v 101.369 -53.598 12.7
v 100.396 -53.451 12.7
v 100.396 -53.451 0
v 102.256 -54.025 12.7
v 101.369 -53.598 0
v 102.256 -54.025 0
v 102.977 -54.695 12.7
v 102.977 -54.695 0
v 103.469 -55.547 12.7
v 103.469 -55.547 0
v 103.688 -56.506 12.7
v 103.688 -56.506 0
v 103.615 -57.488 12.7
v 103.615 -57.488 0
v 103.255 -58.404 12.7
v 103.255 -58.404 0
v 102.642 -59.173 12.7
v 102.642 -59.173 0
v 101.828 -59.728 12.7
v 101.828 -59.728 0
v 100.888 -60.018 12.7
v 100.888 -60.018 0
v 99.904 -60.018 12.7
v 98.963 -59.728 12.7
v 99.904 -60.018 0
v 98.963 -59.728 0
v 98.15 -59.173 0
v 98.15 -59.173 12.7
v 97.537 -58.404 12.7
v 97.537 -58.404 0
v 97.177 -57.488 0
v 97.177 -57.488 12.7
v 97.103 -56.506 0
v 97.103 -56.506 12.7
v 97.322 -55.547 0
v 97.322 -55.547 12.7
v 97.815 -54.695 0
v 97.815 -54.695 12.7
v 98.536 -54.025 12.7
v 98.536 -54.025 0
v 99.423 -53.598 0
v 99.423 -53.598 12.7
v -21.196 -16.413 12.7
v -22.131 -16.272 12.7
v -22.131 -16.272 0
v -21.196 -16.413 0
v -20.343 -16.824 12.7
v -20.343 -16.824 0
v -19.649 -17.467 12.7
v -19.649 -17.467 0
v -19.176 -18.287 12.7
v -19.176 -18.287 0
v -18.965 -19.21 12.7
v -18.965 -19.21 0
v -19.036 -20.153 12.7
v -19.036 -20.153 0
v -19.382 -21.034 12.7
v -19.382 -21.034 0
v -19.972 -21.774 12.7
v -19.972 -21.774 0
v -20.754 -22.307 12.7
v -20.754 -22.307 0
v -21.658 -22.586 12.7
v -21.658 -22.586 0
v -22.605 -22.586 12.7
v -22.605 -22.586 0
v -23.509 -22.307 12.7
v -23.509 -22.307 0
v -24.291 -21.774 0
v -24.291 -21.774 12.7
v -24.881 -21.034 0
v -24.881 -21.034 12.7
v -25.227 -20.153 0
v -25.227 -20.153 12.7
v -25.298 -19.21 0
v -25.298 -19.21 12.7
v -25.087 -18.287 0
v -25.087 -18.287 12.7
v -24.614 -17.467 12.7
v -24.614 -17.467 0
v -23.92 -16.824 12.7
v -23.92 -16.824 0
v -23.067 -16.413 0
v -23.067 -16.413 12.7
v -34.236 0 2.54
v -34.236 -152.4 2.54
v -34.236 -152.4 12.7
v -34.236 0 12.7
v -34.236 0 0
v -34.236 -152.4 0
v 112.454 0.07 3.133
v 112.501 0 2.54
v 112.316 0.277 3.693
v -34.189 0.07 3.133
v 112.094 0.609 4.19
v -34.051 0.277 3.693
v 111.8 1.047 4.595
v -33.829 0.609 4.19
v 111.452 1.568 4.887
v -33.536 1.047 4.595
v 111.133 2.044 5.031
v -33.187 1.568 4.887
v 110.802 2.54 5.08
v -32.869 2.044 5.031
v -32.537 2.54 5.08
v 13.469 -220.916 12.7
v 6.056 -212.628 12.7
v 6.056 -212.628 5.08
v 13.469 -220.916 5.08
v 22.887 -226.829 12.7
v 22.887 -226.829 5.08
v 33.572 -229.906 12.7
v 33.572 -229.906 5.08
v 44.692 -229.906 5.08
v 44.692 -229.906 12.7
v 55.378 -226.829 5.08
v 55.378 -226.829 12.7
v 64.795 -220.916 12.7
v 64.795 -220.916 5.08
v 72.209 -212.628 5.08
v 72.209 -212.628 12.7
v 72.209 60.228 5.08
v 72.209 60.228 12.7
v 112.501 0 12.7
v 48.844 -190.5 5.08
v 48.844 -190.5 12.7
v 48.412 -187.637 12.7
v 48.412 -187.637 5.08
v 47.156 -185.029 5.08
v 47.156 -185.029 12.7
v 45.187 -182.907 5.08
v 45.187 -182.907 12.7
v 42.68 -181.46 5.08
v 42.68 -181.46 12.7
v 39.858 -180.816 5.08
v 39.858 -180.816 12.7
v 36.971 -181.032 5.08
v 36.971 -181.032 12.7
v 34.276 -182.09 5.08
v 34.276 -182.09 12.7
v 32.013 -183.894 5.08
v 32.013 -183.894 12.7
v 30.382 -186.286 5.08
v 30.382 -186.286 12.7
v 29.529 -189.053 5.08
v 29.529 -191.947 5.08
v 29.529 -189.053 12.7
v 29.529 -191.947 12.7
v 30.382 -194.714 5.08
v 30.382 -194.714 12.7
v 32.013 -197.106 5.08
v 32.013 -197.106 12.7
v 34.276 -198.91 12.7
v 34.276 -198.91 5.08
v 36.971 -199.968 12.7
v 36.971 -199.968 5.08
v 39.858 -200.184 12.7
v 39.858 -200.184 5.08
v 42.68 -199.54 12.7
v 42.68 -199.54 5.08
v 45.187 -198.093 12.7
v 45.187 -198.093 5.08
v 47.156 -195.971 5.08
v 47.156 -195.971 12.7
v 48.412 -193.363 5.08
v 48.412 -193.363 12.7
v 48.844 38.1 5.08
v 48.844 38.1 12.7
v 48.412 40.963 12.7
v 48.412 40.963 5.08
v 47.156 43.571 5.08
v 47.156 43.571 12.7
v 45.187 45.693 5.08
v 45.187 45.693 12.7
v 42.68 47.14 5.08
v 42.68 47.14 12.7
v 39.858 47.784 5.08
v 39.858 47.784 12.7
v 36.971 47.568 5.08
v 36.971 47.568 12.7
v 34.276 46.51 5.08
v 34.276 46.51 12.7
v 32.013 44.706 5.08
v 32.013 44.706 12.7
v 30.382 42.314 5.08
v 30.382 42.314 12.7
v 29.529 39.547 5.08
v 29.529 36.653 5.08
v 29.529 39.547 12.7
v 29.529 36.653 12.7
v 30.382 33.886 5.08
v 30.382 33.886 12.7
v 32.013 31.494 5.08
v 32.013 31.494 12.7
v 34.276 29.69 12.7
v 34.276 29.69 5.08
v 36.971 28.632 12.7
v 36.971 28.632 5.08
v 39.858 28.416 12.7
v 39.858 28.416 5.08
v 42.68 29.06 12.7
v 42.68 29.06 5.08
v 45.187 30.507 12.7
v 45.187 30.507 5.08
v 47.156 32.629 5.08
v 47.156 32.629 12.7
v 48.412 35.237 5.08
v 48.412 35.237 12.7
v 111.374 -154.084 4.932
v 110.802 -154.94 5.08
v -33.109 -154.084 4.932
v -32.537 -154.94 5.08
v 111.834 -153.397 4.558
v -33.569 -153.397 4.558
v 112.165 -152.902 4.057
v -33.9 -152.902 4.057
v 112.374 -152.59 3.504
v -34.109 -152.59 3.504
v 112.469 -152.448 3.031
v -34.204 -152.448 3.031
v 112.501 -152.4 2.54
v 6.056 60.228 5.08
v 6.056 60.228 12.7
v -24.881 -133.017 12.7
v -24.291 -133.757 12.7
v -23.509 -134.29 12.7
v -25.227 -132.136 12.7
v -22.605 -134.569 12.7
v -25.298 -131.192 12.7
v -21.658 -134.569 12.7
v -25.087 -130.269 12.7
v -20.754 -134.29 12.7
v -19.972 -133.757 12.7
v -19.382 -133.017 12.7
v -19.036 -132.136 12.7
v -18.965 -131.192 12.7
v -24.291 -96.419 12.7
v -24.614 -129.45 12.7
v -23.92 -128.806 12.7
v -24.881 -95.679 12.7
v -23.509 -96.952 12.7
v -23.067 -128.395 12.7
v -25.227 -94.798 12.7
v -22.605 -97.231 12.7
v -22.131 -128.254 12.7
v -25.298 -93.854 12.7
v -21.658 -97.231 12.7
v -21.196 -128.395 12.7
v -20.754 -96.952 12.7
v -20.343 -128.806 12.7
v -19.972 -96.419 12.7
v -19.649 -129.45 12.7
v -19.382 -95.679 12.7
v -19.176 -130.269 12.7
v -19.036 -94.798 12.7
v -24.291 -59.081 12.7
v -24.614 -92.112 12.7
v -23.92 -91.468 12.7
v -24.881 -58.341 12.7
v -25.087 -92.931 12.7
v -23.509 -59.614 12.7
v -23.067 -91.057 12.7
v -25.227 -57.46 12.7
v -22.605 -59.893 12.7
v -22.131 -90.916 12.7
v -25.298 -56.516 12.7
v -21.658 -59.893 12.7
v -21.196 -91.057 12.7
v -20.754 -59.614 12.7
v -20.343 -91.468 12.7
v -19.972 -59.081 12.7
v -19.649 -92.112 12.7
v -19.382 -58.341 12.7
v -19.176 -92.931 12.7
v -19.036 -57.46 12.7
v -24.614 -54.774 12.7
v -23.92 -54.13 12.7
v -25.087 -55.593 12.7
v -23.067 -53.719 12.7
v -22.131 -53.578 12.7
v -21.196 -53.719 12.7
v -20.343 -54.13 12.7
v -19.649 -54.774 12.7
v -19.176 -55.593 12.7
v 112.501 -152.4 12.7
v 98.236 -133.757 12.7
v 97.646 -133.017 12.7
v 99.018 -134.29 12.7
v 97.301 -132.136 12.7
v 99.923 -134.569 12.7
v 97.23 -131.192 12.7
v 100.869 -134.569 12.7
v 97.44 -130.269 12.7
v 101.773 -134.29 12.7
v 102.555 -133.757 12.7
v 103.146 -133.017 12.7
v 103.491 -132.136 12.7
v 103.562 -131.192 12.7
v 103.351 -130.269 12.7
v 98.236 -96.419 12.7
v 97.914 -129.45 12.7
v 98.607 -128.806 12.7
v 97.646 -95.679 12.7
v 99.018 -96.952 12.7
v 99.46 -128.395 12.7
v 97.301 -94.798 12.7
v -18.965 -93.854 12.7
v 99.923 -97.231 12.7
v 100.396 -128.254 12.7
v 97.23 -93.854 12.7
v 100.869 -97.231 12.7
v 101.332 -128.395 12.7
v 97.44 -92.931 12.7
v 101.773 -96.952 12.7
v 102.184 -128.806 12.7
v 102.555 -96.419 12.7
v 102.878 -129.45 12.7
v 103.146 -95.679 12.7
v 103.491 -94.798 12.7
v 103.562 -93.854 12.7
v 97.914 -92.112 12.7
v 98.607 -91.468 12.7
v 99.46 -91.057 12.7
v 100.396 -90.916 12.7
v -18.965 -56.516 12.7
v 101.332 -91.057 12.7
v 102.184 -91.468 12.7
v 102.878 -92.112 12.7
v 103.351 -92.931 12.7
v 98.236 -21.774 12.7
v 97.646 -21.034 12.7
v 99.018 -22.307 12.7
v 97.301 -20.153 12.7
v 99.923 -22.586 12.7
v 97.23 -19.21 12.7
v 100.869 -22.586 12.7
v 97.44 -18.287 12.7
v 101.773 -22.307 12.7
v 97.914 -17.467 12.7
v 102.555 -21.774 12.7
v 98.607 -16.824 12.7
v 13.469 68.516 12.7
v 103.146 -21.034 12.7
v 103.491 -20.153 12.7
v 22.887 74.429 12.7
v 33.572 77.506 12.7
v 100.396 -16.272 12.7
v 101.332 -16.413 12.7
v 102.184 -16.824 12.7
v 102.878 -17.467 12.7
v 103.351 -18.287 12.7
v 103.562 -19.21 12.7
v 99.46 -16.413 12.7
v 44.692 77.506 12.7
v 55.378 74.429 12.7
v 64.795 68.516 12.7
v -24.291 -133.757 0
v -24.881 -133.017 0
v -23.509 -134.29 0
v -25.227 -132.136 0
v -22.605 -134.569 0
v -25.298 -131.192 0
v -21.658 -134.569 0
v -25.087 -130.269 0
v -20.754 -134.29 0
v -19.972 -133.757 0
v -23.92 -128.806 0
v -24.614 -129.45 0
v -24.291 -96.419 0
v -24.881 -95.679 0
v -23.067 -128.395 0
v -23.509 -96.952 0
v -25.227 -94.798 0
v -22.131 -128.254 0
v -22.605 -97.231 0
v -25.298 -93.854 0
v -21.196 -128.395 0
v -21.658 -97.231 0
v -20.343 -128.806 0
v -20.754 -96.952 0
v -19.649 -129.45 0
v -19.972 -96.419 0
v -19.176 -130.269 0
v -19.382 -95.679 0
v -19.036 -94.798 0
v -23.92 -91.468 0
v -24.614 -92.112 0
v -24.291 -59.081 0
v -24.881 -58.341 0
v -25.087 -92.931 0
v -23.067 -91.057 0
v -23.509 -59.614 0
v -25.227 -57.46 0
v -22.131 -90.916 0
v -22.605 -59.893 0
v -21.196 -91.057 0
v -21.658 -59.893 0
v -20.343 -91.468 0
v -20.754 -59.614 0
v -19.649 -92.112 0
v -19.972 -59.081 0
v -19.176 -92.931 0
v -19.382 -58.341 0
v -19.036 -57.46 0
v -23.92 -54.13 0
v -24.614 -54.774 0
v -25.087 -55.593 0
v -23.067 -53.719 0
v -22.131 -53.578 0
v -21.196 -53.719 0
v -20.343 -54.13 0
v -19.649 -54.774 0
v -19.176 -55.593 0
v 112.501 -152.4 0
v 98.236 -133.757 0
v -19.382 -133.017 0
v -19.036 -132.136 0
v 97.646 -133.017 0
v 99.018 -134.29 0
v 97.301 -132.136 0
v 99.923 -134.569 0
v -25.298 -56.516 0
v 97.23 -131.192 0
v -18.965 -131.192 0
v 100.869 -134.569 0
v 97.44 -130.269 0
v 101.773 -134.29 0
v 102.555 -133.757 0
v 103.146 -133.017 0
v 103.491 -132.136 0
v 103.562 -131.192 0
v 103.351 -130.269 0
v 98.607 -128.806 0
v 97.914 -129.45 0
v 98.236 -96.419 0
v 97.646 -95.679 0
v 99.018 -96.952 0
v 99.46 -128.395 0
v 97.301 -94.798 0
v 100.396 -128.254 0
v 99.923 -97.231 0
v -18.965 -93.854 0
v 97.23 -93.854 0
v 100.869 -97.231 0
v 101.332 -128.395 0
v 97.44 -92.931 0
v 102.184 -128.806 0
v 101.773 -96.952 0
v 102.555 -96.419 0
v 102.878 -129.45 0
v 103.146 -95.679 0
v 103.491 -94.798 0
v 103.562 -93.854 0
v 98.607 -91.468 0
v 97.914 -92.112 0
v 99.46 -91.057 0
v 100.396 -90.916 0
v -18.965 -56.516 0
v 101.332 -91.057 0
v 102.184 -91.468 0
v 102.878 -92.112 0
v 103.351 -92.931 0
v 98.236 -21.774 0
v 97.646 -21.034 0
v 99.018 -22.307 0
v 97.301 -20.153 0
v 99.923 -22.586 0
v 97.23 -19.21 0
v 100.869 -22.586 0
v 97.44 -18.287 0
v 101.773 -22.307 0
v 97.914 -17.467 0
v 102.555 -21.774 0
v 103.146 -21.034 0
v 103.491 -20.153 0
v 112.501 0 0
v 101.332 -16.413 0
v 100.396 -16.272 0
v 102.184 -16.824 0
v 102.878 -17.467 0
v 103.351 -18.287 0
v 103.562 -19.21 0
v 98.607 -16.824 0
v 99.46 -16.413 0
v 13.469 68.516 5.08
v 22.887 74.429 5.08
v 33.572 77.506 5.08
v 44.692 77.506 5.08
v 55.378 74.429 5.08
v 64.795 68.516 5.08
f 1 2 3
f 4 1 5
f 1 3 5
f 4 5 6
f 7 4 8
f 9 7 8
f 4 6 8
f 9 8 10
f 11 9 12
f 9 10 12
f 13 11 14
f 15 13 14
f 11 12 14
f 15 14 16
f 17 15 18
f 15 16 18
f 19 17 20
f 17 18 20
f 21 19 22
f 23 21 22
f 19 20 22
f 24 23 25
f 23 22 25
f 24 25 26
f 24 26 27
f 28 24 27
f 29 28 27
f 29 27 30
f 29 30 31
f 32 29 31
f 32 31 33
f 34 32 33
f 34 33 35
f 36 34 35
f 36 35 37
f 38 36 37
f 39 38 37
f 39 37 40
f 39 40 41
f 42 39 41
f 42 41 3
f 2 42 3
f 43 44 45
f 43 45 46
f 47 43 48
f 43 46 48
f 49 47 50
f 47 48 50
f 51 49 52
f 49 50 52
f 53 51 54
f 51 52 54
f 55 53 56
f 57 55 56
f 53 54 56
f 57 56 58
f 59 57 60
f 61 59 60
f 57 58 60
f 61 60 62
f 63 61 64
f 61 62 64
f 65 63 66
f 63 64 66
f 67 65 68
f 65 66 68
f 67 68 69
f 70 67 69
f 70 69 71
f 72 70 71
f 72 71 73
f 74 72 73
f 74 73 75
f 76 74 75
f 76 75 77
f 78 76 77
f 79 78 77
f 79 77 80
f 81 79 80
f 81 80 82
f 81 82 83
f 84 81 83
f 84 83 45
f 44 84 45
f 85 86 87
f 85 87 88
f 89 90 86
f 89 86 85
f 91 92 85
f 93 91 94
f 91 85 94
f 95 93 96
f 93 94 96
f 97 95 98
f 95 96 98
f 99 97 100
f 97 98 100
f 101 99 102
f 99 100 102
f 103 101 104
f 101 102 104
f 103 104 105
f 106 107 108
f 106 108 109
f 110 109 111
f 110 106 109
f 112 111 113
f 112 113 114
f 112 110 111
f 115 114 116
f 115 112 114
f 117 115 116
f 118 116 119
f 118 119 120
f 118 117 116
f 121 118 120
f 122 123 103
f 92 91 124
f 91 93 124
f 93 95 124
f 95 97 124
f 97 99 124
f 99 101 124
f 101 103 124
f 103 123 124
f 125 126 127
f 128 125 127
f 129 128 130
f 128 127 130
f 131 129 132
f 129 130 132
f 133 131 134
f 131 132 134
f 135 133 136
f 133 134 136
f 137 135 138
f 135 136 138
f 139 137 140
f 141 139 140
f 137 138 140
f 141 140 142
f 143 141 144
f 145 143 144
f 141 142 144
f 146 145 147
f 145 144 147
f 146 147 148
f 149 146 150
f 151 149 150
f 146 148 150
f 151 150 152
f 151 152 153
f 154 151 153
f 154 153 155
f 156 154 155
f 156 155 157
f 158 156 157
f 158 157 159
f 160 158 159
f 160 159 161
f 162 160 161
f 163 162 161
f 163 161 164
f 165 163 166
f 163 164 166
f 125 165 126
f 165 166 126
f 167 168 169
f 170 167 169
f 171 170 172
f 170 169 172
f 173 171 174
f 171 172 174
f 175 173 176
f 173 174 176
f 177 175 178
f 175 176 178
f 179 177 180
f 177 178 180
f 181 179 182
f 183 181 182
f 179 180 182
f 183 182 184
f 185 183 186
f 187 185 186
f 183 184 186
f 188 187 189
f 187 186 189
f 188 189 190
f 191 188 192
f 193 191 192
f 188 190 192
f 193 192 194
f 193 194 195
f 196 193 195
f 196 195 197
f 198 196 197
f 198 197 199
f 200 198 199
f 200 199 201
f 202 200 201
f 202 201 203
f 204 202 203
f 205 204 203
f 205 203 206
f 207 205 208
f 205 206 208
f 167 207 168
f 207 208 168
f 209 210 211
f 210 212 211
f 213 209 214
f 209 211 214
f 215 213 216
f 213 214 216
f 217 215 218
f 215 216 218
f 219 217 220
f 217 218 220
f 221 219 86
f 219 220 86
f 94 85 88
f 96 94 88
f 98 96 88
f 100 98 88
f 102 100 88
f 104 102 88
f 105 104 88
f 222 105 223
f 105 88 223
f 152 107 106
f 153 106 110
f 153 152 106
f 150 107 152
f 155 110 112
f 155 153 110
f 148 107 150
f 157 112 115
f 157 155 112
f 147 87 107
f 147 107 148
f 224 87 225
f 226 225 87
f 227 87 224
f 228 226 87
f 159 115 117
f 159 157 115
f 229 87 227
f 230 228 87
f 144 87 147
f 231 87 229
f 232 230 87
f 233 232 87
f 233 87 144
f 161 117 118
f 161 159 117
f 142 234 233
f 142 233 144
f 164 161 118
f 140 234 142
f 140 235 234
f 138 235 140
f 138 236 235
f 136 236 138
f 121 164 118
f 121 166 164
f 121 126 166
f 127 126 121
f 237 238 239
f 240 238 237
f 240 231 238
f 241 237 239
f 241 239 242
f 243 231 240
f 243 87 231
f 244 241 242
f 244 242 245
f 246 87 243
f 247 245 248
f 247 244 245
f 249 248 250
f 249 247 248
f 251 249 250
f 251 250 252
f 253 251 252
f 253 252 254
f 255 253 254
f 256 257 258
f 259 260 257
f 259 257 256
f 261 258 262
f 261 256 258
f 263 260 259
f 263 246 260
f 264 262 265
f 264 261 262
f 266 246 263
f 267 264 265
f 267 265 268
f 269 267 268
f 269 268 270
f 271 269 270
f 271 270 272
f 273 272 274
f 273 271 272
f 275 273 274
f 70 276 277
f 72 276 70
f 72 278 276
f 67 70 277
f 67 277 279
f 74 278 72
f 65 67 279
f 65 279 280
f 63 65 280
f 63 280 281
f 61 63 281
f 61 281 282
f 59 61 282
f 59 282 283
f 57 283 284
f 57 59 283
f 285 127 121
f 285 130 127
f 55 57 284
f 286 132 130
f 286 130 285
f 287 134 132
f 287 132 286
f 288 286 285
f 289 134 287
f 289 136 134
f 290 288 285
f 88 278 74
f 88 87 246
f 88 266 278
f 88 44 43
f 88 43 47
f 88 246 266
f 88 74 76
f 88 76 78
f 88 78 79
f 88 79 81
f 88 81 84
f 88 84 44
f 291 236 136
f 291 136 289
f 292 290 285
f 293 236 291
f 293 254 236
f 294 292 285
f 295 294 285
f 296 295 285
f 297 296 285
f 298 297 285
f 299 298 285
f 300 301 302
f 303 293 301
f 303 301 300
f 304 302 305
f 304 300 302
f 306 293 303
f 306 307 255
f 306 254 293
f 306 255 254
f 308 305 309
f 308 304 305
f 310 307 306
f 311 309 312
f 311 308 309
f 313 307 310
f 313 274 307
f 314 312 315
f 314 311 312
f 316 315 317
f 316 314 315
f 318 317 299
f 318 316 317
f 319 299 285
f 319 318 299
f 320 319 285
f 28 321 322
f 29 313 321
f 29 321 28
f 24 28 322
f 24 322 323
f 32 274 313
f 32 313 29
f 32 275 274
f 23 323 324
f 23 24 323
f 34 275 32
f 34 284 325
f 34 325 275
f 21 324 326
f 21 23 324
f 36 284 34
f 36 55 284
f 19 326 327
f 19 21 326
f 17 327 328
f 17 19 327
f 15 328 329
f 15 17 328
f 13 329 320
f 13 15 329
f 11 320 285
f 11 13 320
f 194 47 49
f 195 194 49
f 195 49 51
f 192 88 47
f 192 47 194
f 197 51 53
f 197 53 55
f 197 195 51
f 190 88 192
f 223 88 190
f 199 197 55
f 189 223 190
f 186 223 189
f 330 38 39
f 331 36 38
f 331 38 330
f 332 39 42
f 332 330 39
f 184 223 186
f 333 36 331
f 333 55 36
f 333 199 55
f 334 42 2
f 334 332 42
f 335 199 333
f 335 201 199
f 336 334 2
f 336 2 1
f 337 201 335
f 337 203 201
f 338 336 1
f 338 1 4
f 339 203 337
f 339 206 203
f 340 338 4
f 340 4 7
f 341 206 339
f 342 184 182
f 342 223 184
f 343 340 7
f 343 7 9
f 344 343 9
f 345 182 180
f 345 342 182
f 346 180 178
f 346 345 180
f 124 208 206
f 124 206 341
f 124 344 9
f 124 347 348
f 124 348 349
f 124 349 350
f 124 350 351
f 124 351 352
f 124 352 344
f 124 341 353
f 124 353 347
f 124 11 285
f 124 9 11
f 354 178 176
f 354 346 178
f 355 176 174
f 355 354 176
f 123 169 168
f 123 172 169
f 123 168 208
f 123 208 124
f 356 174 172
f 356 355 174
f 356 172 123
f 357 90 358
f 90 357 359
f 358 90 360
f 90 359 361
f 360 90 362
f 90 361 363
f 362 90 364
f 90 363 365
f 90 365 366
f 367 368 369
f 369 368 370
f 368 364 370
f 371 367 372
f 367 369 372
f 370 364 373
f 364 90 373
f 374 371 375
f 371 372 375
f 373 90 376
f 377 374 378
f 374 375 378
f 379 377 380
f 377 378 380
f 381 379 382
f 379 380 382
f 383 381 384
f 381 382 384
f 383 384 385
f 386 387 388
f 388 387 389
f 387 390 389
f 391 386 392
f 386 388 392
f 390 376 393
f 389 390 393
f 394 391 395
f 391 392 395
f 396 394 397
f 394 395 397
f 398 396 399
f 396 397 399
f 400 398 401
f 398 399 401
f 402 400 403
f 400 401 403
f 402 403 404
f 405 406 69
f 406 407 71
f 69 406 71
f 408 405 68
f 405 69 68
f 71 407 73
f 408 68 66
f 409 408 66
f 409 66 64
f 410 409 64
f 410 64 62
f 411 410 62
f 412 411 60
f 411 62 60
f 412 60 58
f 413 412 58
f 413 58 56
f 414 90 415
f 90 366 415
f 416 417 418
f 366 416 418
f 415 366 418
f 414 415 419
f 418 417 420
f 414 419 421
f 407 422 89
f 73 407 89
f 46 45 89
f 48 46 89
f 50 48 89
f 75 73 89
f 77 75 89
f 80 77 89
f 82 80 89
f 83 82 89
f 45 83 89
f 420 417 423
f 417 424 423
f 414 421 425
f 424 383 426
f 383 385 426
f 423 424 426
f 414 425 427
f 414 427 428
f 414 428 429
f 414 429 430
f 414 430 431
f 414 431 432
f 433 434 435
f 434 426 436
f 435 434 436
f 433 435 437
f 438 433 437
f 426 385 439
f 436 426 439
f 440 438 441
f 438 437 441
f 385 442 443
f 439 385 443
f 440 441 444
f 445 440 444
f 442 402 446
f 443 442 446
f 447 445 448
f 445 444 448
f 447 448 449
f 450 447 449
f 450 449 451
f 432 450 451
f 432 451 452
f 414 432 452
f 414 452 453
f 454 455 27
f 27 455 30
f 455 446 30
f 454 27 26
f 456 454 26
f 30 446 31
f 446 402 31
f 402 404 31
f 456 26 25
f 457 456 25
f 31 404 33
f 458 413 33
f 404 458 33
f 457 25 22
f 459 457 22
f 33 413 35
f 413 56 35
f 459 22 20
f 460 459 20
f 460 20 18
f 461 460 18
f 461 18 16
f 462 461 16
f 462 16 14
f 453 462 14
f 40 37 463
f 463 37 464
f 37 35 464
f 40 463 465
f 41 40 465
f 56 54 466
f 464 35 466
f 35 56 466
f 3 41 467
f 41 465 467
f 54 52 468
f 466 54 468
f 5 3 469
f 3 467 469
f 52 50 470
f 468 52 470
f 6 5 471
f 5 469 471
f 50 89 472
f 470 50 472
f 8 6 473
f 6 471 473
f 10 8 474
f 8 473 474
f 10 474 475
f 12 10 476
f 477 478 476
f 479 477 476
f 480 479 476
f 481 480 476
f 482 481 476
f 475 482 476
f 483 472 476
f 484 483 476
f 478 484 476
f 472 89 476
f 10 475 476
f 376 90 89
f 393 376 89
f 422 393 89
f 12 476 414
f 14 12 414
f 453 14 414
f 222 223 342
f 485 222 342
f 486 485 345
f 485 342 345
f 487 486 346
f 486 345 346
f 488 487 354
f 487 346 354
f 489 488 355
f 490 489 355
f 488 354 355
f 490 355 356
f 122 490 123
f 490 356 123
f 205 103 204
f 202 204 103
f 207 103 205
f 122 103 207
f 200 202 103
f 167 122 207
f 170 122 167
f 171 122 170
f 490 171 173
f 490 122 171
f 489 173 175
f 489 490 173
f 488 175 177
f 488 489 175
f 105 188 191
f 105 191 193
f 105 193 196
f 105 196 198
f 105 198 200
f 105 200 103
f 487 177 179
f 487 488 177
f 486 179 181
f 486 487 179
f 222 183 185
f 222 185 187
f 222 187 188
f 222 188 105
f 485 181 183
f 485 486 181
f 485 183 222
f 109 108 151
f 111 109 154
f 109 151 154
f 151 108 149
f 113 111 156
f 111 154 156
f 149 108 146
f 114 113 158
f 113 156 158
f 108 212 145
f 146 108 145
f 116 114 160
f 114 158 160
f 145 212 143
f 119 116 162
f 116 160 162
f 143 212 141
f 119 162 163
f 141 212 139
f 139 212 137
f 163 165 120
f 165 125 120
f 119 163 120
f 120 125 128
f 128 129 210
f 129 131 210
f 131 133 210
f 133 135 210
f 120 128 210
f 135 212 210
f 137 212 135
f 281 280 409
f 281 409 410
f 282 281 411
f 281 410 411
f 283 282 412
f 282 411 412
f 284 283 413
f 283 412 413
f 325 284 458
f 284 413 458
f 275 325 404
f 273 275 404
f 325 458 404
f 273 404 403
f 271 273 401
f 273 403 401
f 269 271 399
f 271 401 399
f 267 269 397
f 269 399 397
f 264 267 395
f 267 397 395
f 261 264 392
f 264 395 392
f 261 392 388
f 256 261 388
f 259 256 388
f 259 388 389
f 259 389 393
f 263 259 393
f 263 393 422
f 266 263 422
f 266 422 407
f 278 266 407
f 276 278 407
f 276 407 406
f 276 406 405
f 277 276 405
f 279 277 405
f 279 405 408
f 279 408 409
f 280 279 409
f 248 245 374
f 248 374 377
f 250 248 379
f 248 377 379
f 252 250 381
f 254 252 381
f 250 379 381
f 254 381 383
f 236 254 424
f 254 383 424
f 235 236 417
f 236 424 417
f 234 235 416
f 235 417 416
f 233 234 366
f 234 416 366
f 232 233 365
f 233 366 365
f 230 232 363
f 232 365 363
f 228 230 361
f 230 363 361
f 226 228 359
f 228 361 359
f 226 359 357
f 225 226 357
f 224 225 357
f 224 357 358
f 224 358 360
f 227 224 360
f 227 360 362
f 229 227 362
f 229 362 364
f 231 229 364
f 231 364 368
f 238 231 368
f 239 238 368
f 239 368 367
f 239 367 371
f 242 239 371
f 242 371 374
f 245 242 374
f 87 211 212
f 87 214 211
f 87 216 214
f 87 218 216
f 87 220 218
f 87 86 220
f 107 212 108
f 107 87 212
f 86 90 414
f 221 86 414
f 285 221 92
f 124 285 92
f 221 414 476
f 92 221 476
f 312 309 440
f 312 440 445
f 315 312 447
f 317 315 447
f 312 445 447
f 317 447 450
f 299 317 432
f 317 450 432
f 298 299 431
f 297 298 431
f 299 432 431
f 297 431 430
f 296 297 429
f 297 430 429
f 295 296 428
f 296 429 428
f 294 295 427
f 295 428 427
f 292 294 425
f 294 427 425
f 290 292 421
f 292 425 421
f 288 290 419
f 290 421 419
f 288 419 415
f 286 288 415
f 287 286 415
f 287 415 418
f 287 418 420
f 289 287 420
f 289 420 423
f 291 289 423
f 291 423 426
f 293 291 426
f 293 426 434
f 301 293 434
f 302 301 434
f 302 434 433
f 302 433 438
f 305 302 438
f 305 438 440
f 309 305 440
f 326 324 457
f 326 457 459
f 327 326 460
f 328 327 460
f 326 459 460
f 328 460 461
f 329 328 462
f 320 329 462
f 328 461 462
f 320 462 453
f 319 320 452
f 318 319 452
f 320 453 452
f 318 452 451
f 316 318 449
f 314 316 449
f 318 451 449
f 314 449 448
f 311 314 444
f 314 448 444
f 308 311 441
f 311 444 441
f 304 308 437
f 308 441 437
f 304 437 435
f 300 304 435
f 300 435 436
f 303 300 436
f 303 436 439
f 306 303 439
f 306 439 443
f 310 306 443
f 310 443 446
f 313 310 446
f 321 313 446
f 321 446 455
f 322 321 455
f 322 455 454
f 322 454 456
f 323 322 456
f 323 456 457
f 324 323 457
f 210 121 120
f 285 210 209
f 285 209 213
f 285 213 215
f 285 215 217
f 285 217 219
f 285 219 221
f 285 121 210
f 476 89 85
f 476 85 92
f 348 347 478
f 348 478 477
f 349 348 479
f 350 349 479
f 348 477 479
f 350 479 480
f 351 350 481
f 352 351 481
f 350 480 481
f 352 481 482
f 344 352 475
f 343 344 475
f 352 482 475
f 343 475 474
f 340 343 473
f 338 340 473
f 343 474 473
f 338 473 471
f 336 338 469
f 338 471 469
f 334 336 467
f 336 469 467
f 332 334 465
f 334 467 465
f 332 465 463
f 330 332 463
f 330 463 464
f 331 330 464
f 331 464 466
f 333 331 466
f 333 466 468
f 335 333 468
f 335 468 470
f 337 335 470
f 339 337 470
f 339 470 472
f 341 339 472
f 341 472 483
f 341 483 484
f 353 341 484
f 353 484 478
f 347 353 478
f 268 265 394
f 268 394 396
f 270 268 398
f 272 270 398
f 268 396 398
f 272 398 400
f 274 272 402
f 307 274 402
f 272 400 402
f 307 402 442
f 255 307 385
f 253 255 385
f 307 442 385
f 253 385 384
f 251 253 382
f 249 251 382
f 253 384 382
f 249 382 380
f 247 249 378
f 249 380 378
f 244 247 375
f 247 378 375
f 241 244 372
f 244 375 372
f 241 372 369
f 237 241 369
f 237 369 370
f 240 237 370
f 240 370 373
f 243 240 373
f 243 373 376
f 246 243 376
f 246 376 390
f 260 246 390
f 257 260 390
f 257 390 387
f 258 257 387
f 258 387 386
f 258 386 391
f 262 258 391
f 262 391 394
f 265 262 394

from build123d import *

# Parameters (mm, degrees)
SKETCH1_W      = 146.737083443
SKETCH1_H      = 152.4
SKETCH1_R      = 2.814870932
EXTRUDE1_DEPTH = 12.7
SKETCH2_R      = 3.175
SKETCH2_R_2    = 3.301739158
EXTRUDE2_DEPTH = 192.148134104
SKETCH3_R      = 9.711530505
EXTRUDE3_DEPTH = 7.62
FILLET1_R      = 2.54


with BuildPart() as part:
    # Sketch1 → Extrude1 (new body)
    with BuildSketch(Plane.XY):
        with Locations((39.132231405, -76.2)):
            Rectangle(SKETCH1_W, SKETCH1_H)
        with Locations((-22.131450225, -19.446874936)):
            Circle(SKETCH1_R, mode=Mode.SUBTRACT)
    extrude(amount=EXTRUDE1_DEPTH)

    # Sketch2 → Extrude2 (cut, through all)
    with BuildSketch(Plane(origin=(-5.4e-08, -8.6e-08, -12.901274016), x_dir=(-1.0, 0, 4.210511821155492e-09), z_dir=(-4.210511821155492e-09, -6.669209052807934e-09, -1.0))):
        with Locations(Location((-100.395913074, -19.446875, 0), (0, 0, 90))):
            Circle(SKETCH2_R)
        with Locations(Location((-100.395913114, -56.753124936, 0), (0, 0, 90))):
            Circle(SKETCH2_R_2)
        with Locations(Location((-100.395913114, -94.091124936, 0), (0, 0, 90))):
            Circle(SKETCH2_R)
        with Locations(Location((-100.395913114, -131.429124936, 0), (0, 0, 90))):
            Circle(SKETCH2_R)
        with Locations(Location((22.131450318, -56.753125108, 0), (0, 0, 90))):
            Circle(SKETCH2_R)
        with Locations(Location((22.131450318, -94.091124936, 0), (0, 0, 90))):
            Circle(SKETCH2_R)
        with Locations(Location((22.131450318, -131.429124936, 0), (0, 0, 90))):
            Circle(SKETCH2_R)
        with Locations(Location((22.131450278, -19.446875021, 0), (0, 0, 90))):
            Circle(SKETCH2_R)
    extrude(amount=-EXTRUDE2_DEPTH, mode=Mode.SUBTRACT)

    # Sketch3 → Extrude3 (add)
    # profile 1 of 2: a face of its own
    with BuildSketch(Plane.XY.offset(12.7)):
        with BuildLine():
            Line((112.500773126, -152.4), (-34.236310317, -152.4))
            Line((-34.236310317, -152.4), (6.055614242, -212.627943895))
            ThreePointArc((6.055614242, -212.627943895), (39.132231405, -230.295835259), (72.208848567, -212.627943895))
            Line((72.208848567, -212.627943895), (112.500773126, -152.4))
        make_face()
        with Locations((39.132231405, -190.5)):
            Circle(SKETCH3_R, mode=Mode.SUBTRACT)
    # profile 2 of 2: a face of its own
    with BuildSketch(Plane.XY.offset(12.7)):
        with BuildLine():
            Line((112.500773126, 0), (-34.236310317, 0))
            Line((-34.236310317, 0), (6.055614242, 60.227943895))
            ThreePointArc((6.055614242, 60.227943895), (39.132231405, 77.895835259), (72.208848567, 60.227943895))
            Line((72.208848567, 60.227943895), (112.500773126, 0))
        make_face()
        with Locations((39.132231405, 38.1)):
            Circle(SKETCH3_R, mode=Mode.SUBTRACT)
    extrude(amount=-EXTRUDE3_DEPTH)

    # Fillet1
    fillet1_edges = [part.edges().sort_by_distance(p)[0] for p in [
        (39.132231405, -152.4, 5.08),
        (39.132231405, 0, 5.08),
    ]]
    fillet(fillet1_edges, radius=FILLET1_R)


solid = part.part
